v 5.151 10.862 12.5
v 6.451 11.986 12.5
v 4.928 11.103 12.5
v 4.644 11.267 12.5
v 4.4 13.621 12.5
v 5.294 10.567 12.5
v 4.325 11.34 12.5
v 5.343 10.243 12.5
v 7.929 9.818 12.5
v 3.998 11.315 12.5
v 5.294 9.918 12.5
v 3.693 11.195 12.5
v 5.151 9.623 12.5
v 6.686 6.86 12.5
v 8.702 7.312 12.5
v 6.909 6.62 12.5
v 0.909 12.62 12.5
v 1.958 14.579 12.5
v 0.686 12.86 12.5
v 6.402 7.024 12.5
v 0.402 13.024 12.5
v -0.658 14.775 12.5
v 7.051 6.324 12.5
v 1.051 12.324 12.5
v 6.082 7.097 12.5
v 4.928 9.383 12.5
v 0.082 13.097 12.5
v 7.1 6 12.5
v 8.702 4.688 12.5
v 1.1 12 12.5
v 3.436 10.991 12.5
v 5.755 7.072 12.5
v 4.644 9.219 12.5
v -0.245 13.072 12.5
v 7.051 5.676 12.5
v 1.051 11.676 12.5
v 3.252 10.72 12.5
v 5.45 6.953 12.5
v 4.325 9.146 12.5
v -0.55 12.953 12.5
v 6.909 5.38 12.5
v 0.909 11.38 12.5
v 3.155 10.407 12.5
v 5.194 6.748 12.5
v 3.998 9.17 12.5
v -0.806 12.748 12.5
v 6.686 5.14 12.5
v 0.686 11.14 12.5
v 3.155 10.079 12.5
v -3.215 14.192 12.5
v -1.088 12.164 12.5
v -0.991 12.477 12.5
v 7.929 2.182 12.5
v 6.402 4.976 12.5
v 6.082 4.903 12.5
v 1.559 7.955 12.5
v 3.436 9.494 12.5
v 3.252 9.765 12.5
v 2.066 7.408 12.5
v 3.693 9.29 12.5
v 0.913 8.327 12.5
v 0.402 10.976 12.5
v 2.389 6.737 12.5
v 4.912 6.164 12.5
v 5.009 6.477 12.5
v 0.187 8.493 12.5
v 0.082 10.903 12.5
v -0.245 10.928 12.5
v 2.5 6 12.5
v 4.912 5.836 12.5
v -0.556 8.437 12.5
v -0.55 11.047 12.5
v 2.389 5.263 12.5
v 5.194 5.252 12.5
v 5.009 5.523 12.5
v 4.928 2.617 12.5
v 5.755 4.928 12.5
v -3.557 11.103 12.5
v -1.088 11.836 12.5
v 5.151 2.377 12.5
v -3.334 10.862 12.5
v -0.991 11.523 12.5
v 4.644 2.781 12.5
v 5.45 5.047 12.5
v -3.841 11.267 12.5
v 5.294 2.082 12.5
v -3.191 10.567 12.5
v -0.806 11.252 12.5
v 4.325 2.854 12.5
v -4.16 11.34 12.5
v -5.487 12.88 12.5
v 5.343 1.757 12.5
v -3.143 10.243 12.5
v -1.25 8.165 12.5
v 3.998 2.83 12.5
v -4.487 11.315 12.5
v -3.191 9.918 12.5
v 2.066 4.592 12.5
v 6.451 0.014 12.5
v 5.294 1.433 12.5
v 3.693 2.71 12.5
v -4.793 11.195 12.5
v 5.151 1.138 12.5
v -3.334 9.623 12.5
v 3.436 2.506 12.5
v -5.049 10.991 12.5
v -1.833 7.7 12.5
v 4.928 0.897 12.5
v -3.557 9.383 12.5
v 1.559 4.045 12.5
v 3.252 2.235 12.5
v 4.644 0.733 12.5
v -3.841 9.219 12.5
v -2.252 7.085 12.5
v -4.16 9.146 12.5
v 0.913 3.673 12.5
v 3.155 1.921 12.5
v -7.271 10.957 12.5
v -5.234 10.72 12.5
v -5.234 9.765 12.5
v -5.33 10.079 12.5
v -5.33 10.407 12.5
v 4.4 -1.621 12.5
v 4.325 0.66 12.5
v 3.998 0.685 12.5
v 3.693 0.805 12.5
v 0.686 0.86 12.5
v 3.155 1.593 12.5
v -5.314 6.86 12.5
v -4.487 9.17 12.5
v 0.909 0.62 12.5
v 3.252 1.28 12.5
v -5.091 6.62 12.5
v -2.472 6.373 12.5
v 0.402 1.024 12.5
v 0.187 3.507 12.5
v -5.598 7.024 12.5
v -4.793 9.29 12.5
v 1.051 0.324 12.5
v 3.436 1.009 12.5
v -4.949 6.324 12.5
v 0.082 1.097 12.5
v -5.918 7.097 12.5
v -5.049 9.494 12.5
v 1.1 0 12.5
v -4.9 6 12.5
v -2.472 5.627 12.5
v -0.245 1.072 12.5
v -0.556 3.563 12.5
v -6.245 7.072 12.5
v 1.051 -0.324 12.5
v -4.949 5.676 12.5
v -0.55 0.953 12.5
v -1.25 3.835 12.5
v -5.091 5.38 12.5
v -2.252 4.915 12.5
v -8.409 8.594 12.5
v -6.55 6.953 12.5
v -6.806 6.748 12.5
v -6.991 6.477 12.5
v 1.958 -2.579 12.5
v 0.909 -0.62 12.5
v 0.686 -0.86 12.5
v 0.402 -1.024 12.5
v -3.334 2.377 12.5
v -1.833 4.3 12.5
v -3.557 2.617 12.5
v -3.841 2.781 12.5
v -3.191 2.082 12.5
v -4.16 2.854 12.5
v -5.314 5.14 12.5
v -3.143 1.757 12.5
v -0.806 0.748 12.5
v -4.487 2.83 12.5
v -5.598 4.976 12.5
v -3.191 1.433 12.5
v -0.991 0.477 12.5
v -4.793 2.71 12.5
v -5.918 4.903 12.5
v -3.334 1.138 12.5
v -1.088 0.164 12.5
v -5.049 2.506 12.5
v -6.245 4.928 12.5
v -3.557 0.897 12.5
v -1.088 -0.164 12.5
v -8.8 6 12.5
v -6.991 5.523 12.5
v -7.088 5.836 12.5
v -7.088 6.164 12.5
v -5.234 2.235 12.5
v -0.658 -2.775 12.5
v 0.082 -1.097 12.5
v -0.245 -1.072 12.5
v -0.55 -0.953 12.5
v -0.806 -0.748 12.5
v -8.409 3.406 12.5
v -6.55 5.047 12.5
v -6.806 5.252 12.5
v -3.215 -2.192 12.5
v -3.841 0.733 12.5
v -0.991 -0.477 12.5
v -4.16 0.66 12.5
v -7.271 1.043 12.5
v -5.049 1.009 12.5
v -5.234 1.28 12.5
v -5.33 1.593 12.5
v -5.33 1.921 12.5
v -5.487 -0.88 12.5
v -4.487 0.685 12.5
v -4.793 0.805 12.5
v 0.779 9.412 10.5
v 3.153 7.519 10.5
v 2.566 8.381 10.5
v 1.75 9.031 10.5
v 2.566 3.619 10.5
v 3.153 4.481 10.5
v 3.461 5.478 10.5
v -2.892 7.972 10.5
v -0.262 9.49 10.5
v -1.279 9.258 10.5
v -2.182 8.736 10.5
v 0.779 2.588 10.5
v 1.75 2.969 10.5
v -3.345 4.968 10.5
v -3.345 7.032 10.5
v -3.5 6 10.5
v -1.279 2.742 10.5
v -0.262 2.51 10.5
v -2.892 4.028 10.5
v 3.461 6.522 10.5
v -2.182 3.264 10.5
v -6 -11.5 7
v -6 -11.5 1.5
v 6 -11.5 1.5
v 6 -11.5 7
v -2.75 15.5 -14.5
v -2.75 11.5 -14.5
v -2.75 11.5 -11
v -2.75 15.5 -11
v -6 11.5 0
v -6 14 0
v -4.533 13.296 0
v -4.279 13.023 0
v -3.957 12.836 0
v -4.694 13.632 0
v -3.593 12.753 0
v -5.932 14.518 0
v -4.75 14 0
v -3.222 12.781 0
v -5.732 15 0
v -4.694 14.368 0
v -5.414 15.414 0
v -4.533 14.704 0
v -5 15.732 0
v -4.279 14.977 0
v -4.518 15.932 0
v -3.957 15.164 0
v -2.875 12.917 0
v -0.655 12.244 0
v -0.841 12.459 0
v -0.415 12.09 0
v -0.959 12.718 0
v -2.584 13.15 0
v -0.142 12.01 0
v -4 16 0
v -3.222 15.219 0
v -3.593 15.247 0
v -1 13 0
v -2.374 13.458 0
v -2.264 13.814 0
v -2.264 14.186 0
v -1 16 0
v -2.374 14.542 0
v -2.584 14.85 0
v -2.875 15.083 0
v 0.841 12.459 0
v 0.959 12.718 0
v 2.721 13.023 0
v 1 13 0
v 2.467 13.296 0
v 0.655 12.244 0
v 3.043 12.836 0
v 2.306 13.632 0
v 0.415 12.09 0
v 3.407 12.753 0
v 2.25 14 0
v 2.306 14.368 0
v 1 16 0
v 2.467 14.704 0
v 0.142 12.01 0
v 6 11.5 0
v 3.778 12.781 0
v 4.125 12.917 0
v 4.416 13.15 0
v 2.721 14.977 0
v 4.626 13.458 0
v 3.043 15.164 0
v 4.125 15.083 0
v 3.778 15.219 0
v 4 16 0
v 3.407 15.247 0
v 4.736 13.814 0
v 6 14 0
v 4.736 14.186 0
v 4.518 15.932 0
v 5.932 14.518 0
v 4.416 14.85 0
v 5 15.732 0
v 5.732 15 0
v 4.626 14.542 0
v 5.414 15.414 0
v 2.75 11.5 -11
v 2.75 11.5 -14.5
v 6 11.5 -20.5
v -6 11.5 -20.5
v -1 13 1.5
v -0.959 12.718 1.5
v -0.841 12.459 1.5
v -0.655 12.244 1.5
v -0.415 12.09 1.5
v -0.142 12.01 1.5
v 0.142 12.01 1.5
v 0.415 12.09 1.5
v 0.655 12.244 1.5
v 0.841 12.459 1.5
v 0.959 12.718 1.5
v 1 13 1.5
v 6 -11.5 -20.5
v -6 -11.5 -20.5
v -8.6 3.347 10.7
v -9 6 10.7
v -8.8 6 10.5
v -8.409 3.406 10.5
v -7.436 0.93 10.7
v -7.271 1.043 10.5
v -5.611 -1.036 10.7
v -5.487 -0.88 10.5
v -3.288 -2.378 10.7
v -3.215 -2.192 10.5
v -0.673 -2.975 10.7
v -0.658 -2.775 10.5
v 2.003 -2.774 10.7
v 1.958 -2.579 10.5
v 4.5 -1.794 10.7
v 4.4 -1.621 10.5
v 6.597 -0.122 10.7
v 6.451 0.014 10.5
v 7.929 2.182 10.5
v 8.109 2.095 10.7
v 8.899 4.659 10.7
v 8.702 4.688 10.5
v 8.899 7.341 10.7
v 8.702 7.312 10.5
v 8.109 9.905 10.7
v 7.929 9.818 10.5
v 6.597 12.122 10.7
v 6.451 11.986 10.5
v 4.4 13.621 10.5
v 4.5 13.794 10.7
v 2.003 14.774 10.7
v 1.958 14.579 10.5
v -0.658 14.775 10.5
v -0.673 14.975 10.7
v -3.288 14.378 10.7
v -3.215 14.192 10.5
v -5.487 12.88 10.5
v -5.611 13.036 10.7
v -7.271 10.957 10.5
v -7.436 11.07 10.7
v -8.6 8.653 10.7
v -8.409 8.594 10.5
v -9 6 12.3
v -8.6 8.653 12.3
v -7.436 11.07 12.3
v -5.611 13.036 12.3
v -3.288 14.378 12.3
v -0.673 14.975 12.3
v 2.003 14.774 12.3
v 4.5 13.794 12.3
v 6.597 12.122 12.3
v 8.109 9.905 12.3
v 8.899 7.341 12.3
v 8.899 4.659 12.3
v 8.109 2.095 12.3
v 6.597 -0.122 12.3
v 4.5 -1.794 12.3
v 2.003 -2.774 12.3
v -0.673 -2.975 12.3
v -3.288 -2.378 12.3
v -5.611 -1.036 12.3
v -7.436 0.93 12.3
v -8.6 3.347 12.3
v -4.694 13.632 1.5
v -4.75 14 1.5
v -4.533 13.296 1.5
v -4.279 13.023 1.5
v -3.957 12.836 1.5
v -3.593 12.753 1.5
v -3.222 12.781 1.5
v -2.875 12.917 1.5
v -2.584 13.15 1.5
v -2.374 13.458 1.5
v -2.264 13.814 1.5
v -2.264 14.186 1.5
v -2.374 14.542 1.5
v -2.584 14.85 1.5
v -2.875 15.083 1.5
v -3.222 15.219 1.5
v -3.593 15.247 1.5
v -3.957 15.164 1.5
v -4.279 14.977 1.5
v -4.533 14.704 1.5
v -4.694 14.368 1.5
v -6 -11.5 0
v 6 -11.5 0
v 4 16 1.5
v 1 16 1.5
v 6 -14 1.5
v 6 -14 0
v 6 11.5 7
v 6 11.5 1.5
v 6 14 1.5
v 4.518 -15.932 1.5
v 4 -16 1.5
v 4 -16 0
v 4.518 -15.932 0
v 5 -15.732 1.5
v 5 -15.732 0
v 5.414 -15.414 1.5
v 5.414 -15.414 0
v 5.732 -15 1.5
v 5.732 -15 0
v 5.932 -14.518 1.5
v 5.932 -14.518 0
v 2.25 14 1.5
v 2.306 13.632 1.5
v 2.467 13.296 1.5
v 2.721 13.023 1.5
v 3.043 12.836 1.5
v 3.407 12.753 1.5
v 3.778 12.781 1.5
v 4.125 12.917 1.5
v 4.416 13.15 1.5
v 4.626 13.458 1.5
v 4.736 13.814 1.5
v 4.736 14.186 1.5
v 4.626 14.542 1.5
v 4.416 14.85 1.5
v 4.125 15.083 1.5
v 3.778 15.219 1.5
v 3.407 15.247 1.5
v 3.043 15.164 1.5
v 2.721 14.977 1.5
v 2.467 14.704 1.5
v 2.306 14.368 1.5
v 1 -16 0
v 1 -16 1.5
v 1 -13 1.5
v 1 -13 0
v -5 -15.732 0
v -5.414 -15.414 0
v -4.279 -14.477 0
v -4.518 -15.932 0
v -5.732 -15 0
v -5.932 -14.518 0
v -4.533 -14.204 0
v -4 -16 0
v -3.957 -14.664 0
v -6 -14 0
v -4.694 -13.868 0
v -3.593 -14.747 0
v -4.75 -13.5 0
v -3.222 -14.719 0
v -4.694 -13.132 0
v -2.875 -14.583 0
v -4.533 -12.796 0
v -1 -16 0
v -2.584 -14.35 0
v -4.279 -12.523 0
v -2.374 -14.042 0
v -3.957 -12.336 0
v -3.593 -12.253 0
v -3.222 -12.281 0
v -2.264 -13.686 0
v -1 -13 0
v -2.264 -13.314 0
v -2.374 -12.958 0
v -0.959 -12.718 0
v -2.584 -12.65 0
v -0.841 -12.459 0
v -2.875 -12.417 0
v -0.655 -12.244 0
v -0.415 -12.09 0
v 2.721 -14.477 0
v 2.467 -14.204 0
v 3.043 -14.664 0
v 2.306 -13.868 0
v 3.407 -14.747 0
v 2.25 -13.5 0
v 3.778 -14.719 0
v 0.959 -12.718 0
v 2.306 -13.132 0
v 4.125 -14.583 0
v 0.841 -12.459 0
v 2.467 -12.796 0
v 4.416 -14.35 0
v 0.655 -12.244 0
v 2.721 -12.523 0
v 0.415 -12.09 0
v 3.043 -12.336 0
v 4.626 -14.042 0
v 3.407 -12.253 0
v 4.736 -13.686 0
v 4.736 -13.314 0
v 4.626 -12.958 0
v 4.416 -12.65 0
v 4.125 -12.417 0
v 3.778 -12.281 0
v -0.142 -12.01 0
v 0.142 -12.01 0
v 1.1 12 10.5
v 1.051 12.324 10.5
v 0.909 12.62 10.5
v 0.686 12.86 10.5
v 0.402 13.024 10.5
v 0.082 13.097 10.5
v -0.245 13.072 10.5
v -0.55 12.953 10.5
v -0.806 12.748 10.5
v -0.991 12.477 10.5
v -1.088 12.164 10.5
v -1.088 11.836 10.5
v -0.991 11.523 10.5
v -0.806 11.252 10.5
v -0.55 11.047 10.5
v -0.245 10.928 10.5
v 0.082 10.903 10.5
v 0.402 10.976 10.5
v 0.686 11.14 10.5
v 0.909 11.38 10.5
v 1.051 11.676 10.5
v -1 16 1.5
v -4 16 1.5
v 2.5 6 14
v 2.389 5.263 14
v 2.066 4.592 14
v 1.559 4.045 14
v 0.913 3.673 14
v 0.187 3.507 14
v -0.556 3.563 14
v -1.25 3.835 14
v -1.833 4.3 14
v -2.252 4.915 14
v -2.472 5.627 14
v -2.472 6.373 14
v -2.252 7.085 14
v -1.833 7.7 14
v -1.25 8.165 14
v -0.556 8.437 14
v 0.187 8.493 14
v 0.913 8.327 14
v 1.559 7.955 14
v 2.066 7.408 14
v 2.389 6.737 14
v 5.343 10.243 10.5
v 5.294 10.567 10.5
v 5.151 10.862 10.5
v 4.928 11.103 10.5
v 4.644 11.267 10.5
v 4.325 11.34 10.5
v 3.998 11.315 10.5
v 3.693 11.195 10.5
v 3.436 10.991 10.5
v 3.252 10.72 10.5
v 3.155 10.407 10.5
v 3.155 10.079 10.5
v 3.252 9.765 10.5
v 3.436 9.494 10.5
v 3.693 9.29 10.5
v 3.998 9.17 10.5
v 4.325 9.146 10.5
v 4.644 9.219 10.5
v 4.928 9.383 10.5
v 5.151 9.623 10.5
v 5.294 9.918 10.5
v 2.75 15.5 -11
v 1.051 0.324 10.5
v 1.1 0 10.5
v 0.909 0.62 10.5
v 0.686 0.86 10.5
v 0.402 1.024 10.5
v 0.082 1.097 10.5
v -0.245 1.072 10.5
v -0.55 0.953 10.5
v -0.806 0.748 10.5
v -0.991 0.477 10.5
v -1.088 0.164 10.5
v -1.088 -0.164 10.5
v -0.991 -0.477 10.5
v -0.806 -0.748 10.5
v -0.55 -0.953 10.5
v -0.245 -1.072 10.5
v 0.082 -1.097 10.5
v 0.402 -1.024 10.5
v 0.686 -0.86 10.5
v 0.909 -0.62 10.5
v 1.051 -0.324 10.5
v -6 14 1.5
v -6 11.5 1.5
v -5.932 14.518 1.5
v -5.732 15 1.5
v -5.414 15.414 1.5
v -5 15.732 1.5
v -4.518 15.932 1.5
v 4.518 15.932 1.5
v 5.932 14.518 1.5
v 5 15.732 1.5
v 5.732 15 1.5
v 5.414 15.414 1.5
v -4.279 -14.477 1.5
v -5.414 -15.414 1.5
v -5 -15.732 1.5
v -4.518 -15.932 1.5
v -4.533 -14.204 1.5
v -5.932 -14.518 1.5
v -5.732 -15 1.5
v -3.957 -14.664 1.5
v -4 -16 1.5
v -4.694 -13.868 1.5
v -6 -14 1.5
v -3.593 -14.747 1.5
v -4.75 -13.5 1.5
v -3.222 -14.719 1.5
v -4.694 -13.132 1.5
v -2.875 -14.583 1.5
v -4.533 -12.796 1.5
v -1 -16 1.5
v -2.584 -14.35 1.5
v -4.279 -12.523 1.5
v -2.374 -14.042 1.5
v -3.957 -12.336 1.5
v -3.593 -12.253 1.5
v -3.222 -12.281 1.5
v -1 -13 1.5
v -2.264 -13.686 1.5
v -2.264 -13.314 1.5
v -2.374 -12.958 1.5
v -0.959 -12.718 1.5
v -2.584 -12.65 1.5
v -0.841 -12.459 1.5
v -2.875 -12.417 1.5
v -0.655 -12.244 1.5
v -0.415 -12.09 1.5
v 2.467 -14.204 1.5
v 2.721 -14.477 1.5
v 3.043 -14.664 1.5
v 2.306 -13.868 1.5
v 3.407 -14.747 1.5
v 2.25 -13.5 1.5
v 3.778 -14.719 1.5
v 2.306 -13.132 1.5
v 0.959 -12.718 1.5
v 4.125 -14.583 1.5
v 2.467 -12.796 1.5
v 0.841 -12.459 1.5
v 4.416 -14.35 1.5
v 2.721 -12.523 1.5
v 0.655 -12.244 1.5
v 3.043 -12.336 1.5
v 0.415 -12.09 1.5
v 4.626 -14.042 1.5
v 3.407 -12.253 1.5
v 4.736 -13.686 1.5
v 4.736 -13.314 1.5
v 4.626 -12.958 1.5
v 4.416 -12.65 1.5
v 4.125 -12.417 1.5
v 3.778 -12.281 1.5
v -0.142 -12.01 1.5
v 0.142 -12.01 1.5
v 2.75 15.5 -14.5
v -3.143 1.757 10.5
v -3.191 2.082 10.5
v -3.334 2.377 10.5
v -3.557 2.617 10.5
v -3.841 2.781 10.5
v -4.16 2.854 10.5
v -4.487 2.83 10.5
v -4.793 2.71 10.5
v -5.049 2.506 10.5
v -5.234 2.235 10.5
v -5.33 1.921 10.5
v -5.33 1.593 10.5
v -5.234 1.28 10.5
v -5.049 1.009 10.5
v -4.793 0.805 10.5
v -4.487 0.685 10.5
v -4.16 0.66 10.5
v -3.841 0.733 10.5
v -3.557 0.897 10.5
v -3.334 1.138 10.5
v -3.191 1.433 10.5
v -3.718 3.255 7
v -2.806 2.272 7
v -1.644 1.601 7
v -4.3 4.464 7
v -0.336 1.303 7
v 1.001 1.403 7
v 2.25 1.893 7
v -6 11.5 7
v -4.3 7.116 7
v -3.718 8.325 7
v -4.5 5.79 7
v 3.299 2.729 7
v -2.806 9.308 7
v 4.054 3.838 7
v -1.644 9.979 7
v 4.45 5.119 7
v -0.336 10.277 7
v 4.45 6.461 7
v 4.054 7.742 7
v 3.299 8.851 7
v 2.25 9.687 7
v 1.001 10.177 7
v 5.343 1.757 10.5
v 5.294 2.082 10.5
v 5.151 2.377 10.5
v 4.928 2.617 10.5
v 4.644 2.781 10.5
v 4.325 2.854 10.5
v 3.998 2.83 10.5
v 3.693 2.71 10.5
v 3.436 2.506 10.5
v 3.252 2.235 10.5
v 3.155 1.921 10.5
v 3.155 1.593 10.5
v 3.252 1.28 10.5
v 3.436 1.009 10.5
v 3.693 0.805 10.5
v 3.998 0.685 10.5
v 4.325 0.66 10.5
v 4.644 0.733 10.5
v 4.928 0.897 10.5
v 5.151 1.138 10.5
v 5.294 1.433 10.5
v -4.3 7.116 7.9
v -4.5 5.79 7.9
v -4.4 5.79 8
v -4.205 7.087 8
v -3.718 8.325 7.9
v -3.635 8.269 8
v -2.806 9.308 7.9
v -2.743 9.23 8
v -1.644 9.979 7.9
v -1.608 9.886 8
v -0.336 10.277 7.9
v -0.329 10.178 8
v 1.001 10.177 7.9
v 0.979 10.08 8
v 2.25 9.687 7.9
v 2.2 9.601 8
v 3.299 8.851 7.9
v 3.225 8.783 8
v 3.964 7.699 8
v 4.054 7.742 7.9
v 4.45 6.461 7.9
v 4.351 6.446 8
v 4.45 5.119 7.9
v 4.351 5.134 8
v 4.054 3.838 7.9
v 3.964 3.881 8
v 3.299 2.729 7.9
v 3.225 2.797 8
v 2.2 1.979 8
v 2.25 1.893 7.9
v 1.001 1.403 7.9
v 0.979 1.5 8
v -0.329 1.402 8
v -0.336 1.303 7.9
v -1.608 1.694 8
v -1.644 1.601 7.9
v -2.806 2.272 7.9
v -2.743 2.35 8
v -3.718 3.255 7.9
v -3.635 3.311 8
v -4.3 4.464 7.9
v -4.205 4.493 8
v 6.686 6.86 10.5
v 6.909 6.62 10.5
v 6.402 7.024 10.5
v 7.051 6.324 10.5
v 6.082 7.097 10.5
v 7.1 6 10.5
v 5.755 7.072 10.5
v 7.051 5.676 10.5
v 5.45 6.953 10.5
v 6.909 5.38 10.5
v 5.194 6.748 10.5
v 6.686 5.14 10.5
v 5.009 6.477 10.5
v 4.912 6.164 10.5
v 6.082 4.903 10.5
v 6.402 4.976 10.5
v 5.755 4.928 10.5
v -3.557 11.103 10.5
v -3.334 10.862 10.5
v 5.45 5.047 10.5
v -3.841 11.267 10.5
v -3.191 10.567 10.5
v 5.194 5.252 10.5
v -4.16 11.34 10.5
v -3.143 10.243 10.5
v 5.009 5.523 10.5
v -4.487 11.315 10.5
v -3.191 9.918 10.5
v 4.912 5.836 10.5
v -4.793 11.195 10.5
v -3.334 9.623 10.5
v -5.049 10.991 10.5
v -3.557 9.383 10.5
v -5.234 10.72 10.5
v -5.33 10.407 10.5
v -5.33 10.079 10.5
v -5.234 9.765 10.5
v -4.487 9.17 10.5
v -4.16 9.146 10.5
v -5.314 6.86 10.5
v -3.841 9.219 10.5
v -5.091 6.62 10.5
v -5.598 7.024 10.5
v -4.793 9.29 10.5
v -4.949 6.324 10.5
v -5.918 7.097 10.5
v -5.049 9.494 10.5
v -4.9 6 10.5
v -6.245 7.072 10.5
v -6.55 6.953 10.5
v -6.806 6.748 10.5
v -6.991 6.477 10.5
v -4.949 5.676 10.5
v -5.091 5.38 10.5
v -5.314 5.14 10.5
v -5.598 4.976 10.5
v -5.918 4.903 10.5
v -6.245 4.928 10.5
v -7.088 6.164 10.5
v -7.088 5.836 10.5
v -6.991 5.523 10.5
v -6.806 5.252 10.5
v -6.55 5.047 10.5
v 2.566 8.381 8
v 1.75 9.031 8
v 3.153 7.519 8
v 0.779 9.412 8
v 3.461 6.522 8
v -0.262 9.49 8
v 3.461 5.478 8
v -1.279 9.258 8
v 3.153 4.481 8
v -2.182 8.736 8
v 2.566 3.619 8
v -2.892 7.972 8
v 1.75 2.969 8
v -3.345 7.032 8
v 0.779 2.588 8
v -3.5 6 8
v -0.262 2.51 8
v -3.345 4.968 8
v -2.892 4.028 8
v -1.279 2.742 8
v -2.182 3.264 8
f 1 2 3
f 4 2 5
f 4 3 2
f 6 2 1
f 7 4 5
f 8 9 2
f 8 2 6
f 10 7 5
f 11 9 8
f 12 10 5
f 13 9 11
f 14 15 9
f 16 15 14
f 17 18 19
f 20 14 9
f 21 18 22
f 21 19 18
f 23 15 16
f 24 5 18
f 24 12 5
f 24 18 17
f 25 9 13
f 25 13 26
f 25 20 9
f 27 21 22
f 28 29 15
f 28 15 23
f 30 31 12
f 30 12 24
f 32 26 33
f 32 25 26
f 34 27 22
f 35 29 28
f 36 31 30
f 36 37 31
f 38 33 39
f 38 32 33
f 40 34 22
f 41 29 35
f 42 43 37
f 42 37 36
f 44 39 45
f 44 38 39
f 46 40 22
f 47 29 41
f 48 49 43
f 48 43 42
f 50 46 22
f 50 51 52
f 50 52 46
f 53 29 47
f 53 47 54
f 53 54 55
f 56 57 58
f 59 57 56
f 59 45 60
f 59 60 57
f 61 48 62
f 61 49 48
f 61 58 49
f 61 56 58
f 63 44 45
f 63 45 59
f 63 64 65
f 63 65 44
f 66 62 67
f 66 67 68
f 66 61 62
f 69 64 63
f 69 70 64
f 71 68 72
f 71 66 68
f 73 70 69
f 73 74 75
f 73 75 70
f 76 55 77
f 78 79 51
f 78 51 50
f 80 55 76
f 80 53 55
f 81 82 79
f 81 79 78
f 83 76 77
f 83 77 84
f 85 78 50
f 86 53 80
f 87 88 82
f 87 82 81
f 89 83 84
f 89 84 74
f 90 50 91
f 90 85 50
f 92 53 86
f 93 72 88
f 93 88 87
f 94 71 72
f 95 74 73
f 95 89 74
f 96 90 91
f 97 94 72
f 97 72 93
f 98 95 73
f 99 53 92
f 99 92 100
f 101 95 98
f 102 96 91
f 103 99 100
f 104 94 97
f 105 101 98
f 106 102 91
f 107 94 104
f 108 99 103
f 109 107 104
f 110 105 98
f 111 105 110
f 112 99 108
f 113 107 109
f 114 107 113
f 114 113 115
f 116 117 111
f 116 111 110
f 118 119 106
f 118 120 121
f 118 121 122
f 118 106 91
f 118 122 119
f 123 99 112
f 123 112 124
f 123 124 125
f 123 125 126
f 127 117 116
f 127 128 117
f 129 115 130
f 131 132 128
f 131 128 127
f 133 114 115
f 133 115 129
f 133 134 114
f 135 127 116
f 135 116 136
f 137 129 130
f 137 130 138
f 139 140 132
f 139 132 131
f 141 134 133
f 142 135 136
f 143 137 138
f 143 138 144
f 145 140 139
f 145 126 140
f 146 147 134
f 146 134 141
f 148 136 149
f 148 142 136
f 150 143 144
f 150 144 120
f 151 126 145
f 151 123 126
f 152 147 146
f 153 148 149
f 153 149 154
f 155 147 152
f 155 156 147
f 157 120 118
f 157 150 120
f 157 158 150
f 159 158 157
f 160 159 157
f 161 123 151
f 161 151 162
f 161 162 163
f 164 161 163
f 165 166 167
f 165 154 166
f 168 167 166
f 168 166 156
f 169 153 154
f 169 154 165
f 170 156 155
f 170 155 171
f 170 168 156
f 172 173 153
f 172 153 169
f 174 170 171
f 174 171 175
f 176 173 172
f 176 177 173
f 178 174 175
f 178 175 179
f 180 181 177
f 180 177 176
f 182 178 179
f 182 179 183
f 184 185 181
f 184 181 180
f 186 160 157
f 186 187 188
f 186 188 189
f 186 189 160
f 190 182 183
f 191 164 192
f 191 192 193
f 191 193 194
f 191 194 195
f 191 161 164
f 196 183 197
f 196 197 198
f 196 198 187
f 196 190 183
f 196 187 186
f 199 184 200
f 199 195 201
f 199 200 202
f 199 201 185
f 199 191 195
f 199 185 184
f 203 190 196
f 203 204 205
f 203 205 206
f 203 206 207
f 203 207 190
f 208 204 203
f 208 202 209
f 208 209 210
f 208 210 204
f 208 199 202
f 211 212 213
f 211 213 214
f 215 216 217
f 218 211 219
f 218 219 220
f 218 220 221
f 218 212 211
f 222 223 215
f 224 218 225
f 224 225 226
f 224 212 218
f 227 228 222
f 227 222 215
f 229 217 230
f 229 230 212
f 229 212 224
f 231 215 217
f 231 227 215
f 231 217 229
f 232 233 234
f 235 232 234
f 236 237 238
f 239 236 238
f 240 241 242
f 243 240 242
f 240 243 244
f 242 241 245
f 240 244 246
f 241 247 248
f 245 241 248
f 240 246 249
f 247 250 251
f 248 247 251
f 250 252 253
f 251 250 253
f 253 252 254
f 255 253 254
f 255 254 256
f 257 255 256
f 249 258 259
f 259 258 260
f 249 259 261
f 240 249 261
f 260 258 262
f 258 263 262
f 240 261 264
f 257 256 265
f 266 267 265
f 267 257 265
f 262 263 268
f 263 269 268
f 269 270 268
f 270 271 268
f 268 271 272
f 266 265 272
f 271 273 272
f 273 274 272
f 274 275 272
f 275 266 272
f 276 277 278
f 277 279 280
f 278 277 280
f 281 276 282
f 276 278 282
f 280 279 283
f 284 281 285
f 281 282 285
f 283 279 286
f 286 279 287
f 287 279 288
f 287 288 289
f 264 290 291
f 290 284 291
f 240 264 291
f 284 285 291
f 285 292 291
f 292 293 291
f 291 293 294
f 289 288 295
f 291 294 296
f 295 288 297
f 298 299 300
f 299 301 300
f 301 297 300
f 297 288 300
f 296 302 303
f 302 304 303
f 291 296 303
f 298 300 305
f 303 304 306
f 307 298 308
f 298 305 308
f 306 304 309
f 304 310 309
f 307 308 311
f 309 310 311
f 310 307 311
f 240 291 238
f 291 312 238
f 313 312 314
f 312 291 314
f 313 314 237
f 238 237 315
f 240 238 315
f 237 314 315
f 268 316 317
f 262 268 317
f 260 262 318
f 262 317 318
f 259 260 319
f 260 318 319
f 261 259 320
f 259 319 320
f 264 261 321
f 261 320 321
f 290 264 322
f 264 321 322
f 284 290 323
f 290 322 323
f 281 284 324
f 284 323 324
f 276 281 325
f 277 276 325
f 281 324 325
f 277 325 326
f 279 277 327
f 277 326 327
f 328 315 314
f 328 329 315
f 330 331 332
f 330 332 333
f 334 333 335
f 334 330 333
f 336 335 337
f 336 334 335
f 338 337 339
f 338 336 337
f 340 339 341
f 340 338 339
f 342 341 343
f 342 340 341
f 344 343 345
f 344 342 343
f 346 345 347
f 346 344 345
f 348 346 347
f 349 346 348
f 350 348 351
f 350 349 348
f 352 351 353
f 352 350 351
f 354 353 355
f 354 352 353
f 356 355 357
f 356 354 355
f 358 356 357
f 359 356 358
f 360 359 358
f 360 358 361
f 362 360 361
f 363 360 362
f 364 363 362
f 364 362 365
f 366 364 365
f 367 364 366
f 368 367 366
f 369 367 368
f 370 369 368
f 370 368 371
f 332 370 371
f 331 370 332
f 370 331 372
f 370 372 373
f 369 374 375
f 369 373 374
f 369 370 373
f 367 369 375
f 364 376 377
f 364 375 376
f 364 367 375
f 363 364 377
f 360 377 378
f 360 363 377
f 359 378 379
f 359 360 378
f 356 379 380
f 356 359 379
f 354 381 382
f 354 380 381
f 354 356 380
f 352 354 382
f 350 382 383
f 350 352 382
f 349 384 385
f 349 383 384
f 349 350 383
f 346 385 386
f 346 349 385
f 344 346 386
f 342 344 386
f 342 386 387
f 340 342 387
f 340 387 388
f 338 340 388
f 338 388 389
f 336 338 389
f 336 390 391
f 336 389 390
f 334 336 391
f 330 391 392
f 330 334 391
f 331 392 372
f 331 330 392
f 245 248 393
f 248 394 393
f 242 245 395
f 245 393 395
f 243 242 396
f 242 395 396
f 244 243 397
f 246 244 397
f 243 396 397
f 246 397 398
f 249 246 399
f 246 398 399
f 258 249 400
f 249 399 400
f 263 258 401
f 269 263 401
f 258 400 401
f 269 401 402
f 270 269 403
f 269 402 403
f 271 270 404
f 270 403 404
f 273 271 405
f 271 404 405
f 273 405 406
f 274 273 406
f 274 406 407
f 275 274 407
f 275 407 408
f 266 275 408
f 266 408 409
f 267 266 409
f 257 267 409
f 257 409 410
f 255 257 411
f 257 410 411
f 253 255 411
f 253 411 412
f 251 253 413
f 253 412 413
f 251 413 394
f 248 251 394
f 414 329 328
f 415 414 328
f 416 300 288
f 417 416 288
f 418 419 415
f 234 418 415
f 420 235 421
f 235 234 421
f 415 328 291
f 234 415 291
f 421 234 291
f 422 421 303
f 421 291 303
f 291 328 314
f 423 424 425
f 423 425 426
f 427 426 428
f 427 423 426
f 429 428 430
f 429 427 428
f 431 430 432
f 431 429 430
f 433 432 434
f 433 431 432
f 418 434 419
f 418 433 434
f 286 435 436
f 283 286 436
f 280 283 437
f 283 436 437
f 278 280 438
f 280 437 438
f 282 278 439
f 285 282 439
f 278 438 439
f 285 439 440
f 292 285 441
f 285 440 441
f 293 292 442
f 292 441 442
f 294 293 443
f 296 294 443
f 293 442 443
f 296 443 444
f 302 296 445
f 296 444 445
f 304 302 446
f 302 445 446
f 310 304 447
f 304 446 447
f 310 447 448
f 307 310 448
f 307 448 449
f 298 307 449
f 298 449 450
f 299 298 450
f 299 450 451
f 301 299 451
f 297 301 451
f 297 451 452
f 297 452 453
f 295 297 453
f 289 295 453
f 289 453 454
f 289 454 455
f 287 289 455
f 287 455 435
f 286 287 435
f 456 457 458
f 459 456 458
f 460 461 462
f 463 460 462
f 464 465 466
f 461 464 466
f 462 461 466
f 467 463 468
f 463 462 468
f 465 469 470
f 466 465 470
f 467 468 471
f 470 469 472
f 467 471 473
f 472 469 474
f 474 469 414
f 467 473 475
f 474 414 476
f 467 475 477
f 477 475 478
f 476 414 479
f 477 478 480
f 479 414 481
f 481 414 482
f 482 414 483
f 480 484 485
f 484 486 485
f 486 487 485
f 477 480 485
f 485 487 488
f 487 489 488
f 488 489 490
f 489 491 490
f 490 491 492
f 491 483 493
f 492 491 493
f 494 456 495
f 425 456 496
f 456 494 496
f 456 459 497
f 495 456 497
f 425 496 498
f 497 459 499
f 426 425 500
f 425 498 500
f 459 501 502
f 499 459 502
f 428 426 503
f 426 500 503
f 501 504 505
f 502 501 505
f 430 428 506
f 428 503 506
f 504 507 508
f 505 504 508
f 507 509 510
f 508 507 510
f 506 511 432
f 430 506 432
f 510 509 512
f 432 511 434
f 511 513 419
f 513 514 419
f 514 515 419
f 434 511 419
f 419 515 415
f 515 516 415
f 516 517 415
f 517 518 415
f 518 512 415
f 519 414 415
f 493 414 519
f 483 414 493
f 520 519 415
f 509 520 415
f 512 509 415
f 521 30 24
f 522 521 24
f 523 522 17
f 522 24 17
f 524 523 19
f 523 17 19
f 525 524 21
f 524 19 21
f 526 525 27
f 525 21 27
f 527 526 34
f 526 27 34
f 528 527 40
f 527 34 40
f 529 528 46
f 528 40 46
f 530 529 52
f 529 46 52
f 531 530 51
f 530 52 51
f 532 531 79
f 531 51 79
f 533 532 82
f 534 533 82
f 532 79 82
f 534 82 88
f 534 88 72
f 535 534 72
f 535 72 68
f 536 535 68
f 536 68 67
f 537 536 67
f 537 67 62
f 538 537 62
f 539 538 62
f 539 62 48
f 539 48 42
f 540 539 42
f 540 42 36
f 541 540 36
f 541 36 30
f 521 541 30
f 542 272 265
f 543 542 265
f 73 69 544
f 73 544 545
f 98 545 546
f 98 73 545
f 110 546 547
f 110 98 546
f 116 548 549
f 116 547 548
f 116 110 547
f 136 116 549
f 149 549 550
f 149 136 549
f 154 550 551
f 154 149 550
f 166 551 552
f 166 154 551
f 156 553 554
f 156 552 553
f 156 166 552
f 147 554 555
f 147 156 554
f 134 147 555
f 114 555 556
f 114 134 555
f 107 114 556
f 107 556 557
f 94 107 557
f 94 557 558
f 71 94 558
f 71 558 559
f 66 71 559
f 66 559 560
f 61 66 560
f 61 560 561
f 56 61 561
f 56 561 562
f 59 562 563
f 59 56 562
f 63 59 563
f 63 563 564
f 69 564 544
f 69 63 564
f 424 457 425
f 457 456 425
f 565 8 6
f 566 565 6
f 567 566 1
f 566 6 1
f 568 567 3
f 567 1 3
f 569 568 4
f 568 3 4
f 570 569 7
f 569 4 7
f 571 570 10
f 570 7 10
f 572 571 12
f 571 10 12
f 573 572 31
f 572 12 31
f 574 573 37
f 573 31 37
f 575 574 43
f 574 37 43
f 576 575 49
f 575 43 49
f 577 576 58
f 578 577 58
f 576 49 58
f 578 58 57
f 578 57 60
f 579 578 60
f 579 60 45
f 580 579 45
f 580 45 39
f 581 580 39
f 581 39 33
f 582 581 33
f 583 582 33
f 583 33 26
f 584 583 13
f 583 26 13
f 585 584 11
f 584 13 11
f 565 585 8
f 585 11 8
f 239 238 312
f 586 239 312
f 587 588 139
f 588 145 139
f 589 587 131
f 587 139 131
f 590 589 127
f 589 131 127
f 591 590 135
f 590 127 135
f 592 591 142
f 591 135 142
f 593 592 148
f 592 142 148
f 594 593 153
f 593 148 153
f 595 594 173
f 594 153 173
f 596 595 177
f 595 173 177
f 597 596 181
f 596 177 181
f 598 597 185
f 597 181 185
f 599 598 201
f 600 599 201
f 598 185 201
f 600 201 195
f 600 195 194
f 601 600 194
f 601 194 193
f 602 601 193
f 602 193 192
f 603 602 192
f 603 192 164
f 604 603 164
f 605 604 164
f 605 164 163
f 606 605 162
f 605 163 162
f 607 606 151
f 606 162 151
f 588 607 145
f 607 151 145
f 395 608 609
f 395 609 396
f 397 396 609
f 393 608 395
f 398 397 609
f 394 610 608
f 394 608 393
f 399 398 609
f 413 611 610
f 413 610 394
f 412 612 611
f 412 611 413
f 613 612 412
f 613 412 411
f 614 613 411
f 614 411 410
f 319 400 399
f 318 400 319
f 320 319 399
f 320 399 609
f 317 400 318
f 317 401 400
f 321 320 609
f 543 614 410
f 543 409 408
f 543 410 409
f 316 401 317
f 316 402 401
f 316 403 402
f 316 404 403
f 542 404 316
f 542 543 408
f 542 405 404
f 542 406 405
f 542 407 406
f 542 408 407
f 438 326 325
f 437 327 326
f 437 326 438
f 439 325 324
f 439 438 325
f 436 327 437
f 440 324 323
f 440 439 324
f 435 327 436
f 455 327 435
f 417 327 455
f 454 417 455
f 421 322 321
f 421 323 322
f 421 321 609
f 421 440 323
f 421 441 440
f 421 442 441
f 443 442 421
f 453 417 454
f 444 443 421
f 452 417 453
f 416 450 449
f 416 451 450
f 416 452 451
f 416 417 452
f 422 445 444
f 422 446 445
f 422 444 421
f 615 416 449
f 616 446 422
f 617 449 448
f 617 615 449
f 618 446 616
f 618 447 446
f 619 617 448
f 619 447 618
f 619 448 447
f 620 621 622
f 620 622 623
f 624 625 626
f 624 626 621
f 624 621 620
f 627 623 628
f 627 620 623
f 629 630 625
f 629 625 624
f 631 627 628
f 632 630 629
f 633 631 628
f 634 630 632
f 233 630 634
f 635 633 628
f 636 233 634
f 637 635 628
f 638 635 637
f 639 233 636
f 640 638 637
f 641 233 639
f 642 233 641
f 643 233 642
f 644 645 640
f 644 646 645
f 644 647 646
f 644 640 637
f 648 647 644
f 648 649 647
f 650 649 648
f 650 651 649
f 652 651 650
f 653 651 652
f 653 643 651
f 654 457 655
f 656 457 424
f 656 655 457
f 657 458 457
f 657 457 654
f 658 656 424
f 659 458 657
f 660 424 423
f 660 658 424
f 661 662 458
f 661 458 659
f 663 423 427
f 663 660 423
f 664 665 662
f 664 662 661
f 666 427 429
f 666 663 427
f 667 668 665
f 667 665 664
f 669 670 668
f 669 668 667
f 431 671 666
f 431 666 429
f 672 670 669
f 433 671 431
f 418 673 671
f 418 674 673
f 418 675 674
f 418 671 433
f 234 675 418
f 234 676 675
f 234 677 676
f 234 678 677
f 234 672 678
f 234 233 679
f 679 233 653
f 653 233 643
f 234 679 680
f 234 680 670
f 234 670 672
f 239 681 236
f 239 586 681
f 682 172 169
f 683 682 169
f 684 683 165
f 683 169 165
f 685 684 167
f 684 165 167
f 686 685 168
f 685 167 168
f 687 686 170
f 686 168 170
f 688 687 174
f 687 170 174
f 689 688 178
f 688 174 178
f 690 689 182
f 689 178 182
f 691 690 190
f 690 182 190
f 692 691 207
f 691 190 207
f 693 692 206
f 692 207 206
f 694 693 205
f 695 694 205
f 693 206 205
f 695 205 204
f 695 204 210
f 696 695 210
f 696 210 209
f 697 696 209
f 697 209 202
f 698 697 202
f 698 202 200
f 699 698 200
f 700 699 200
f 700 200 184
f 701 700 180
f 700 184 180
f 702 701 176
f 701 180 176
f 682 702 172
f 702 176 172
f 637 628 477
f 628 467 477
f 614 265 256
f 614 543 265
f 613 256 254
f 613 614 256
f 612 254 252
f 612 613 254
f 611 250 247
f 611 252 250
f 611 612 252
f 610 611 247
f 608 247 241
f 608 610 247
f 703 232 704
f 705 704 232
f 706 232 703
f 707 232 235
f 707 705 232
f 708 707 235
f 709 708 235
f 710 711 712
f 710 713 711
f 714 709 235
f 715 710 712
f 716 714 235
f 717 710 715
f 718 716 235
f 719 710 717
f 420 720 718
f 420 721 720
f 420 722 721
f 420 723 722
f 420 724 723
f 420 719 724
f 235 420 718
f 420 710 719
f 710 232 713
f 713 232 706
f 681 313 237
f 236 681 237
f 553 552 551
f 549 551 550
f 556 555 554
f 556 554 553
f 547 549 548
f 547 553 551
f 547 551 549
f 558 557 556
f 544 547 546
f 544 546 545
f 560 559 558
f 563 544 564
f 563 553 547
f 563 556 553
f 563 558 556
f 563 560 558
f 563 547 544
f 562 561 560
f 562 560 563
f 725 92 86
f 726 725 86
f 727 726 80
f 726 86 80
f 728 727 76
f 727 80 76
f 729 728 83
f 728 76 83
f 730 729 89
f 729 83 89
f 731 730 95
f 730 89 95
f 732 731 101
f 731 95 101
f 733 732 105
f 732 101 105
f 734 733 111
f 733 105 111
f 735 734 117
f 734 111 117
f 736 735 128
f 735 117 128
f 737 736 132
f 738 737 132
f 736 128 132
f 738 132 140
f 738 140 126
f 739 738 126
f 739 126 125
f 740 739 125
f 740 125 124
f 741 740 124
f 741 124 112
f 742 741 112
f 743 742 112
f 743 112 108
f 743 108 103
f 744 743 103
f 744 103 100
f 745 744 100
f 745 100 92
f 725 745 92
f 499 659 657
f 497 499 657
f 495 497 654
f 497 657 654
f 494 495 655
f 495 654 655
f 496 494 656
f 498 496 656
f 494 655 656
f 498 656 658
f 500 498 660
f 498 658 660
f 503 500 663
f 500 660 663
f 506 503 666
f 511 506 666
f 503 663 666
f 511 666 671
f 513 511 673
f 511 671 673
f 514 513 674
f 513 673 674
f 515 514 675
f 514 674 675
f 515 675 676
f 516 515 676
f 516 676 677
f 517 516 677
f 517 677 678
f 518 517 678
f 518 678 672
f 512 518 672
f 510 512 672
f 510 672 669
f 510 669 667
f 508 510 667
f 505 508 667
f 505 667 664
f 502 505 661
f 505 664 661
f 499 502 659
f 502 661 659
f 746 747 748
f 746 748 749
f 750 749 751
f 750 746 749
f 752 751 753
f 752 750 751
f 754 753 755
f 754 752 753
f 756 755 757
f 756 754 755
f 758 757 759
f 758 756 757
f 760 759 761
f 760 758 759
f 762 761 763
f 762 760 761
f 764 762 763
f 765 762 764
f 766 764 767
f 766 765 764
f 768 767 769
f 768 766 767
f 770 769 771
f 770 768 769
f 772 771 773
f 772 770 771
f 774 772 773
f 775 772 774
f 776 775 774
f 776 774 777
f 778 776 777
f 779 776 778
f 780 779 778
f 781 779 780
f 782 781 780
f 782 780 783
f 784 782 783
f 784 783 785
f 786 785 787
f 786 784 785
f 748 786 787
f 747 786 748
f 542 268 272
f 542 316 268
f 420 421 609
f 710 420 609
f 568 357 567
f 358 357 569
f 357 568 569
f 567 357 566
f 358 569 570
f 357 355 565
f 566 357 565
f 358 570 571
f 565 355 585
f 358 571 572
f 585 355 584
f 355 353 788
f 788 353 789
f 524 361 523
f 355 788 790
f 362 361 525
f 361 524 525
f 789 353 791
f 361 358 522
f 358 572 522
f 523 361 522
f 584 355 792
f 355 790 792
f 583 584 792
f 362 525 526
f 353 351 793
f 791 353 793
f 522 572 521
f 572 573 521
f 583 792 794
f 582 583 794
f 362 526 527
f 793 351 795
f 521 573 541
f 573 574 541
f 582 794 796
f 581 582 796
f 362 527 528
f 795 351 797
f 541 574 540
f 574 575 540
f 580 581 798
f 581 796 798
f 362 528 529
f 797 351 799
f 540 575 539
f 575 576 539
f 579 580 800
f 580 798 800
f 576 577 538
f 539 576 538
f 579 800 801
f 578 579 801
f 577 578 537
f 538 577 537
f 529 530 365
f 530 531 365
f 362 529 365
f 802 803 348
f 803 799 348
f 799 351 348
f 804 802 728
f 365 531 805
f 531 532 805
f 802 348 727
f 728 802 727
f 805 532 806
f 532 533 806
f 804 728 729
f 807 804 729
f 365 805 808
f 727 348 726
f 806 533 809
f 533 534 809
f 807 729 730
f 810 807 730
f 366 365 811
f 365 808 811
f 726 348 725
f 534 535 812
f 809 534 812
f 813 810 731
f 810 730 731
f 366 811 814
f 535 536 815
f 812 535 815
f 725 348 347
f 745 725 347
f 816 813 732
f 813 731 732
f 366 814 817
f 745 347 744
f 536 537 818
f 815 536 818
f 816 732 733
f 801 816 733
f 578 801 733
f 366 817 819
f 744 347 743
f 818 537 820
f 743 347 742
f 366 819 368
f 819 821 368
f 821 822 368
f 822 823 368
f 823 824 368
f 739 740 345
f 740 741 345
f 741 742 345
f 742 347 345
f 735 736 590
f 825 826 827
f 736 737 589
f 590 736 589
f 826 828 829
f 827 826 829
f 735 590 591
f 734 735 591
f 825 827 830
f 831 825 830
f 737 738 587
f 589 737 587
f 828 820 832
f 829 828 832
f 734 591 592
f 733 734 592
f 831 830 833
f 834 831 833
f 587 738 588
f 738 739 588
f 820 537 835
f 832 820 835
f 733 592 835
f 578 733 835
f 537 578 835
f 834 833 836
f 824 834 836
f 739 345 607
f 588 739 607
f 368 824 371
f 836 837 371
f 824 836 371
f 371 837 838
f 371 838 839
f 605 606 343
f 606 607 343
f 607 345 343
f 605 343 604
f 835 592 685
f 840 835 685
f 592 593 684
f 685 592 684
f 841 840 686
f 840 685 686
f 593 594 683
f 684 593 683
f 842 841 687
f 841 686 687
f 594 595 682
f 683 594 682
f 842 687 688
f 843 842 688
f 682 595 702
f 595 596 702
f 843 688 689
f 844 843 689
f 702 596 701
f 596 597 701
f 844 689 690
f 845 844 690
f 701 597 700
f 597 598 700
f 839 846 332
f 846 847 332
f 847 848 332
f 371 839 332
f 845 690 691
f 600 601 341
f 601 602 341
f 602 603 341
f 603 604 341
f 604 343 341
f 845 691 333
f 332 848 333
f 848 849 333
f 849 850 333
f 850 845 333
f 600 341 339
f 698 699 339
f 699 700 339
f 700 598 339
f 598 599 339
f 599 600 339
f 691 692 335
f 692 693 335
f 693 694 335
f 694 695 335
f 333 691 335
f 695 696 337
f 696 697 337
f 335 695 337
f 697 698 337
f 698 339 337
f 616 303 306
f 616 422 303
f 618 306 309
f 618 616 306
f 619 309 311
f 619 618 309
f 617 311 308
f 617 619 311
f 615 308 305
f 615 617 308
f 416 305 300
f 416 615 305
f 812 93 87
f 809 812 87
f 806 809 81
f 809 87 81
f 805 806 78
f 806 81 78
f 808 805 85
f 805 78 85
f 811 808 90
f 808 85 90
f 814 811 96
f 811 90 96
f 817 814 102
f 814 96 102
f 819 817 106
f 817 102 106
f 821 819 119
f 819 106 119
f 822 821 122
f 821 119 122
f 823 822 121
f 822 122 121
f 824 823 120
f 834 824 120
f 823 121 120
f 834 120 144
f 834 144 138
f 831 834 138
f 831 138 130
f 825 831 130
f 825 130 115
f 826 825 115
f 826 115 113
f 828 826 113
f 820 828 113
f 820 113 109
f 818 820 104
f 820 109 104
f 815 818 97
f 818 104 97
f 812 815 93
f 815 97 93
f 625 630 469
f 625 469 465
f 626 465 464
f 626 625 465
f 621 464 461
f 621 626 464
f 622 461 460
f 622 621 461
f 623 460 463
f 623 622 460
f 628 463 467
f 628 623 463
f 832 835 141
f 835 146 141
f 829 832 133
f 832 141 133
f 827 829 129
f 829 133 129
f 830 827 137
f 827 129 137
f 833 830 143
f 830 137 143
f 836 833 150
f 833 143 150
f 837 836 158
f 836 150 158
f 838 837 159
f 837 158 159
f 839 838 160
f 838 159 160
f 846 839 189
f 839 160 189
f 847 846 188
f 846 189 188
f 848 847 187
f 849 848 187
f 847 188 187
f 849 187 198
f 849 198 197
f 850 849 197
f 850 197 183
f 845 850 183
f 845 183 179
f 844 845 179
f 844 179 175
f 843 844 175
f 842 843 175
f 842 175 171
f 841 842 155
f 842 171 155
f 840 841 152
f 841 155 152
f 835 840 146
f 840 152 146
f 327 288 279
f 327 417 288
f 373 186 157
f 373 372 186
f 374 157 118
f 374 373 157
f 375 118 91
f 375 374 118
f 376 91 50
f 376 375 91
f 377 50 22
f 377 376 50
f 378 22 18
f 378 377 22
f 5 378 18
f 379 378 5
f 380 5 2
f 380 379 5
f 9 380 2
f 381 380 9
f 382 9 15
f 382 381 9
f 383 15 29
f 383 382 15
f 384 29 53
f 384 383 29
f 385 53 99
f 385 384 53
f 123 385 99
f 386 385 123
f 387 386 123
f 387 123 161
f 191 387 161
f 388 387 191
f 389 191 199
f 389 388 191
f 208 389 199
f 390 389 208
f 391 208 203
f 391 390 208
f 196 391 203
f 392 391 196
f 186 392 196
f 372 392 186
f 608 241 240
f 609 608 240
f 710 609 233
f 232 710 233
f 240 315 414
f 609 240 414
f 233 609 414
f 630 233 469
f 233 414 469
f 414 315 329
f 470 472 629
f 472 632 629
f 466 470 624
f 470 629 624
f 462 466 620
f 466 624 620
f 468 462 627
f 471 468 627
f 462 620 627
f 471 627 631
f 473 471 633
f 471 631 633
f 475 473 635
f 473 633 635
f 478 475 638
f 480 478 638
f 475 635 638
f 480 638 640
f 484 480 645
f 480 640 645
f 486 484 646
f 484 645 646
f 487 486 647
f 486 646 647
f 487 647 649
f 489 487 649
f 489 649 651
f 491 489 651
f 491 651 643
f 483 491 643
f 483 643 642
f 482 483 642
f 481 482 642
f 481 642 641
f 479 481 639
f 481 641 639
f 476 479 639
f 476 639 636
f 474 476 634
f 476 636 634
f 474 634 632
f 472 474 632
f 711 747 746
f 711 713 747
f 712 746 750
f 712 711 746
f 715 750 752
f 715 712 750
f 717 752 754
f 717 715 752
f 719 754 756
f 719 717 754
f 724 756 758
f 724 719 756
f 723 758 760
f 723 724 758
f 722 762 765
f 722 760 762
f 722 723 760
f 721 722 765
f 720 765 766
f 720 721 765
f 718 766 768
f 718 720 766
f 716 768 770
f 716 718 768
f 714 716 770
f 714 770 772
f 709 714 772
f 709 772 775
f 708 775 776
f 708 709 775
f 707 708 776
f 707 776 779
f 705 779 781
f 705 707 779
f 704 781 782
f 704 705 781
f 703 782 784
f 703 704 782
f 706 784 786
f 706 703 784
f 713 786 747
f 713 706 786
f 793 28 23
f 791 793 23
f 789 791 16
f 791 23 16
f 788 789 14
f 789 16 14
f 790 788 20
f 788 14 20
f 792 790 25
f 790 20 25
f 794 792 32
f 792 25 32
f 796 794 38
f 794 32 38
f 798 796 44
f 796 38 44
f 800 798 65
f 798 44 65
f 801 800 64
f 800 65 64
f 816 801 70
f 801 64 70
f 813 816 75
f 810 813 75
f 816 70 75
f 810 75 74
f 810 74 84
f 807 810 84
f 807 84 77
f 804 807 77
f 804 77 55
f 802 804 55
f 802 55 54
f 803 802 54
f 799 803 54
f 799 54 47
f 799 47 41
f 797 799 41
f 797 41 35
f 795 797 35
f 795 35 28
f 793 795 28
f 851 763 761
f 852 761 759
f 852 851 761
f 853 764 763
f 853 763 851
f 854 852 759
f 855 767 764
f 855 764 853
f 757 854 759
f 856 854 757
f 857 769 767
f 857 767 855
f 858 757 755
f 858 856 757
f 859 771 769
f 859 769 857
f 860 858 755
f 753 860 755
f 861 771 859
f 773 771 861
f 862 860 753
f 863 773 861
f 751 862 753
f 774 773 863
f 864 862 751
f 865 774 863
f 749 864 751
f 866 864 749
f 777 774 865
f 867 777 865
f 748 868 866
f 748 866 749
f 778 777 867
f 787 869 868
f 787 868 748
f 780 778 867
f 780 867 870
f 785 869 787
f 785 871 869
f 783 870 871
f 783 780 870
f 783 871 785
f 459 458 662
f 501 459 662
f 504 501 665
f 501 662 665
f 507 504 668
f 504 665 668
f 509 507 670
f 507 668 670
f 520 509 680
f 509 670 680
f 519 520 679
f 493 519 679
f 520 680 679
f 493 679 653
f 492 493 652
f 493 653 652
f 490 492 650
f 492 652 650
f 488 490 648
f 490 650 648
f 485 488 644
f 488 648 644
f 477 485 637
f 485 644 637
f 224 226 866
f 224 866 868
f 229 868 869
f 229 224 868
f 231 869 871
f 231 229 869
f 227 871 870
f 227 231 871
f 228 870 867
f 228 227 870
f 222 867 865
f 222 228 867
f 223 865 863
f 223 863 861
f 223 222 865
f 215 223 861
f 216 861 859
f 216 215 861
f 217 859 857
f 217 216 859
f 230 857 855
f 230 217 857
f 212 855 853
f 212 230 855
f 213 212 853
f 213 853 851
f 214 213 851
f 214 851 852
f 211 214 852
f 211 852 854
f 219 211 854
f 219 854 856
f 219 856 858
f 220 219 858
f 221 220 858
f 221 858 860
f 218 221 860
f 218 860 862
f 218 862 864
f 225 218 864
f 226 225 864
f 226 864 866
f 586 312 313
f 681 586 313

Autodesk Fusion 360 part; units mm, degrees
sketch "스케치1" plane through (0, 0, 0) normal (0, 0, 1) x (1, 0, 0)
  line L0 (6, 11.5) -> (-6, 11.5)
  line L1 (-6, 11.5) -> (-6, -11.5)
  line L2 (-6, -11.5) -> (6, -11.5)
  line L3 (6, -11.5) -> (6, 11.5)
  line L4 (6, 11.5) -> (-6, -11.5) construction
  line L5 (-6, 11.5) -> (6, -11.5) construction
  dimension "d1" = 12
  dimension "d2" = 23
extrude "돌출1" add sketch "스케치1" along normal blind 7 makes body 1
sketch "스케치2" plane through (0, 0, 0) normal (0, 0, -1) x (1, 0, 0)
  line L0 (6, -11.5) -> (6, 11.5)
  line L1 (6, 11.5) -> (-6, 11.5)
  line L2 (-6, 11.5) -> (-6, -11.5)
  line L3 (-6, -11.5) -> (6, -11.5)
extrude "돌출2" add sketch "스케치2" along normal blind 20.5 bodies 1
sketch "스케치3" plane through (0, 0, 0) normal (0, 0, 1) x (1, 0, 0)
  line L0 (-6, -16) -> (6, -16)
  line L1 (6, -16) -> (6, 16)
  line L2 (6, 16) -> (-6, 16)
  line L3 (-6, 16) -> (-6, -16)
  line L4 (-6, -16) -> (6, 16) construction
  line L5 (6, -16) -> (-6, 16) construction
  dimension "d7" = 12
  dimension "d8" = 32
extrude "돌출3" add sketch "스케치3" along normal blind 1.5 bodies 1
sketch "스케치4" plane through (0, 0, 7) normal (0, 0, 1) x (-1, 0, 0)
  line L0 (-6, 11.5) -> (-6, -11.5)
  line L1 (-6, -11.5) -> (6, -11.5)
  line L2 (6, -11.5) -> (6, 11.5)
  line L3 (6, 11.5) -> (-6, 11.5)
  circle A0 centre (0, -5.79) radius 4.5
  dimension "d11" = 9
  dimension "d12" = 5.71
extrude "돌출4" add sketch "스케치4" along normal blind 1 contours A0 bodies 1
fillet "필렛1" radius 2 4 edges at (6, 16, 0.75) (-6, 16, 0.75) (6, -16, 0.75) (-6, -16, 0.75) on bodies 1
sketch "스케치5" plane through (0, 0, 1.5) normal (0, 0, 1) x (-1, 0, 0)
  arc A0 (4, -16) -> (6, -14) centre (4, -14) ccw
  line L0 (6, -14) -> (6, -11.5)
  line L1 (6, -11.5) -> (-6, -11.5)
  line L2 (-6, -11.5) -> (-6, -14)
  arc A1 (-6, -14) -> (-4, -16) centre (-4, -14) ccw
  line L3 (-4, -16) -> (4, -16)
  circle A2 centre (3.5, -14) radius 1.25
  circle A3 centre (-3.5, -14) radius 1.25
  line L4 (-6, -11.5) -> (6, -11.5)
  line L5 (1, -16) -> (-1, -16)
  line L6 (-1, -16) -> (-1, -13)
  line L7 (1, -13) -> (1, -16)
  line L8 (1, -16) -> (-1, -13) construction
  line L9 (-1, -16) -> (1, -13) construction
  circle A4 centre (0, -13) radius 1
  point P0 (0, -14.5)
  dimension "d17" = 2.5
  dimension "d18" = 2.5
  dimension "d19" = 2.5
  dimension "d20" = 2.5
  dimension "d21" = 2.5
  dimension "d22" = 2.5
  dimension "d23" = 2
  dimension "d24" = 3
extrude "돌출5" cut sketch "스케치5" against normal blind 1.5 contours L3 L5 L6 L7 A4 | A4 | A2 | A3 bodies 1
sketch "스케치6" plane through (0, 0, 1.5) normal (0, 0, 1) x (-1, 0, 0)
  arc A0 (6, 14) -> (4, 16) centre (4, 14) ccw
  line L0 (4, 16) -> (-4, 16)
  arc A1 (-4, 16) -> (-6, 14) centre (-4, 14) ccw
  line L1 (-6, 14) -> (-6, 11.5)
  line L2 (-6, 11.5) -> (6, 11.5)
  line L3 (6, 11.5) -> (6, 14)
  circle A2 centre (3.5, 13.5) radius 1.25
  circle A3 centre (-3.5, 13.5) radius 1.25
  line L4 (1, 16) -> (-1, 16)
  line L5 (-1, 16) -> (-1, 13)
  line L6 (-1, 13) -> (1, 13)
  line L7 (1, 13) -> (1, 16)
  line L8 (1, 16) -> (-1, 13) construction
  line L9 (-1, 16) -> (1, 13) construction
  circle A4 centre (0, 13) radius 1
  point P0 (0, 14.5)
  dimension "d27" = 2.5
  dimension "d28" = 2.5
  dimension "d29" = 2.5
  dimension "d30" = 2.5
  dimension "d31" = 2.5
  dimension "d32" = 2.5
  dimension "d33" = 2
  dimension "d34" = 3
extrude "돌출6" cut sketch "스케치6" against normal blind 1.5 contours L0 L4 L5 L7 A4 | L6 A4 | L6 A4 | A2 | A3 bodies 1
sketch "스케치7" plane through (0, 0, 8) normal (0, 0, 1) x (-1, 0, 0)
  circle A0 centre (0, -5.79) radius 4.5
sketch "스케치8" plane through (0, 0, 8) normal (0, 0, 1) x (-1, 0, 0)
  circle A0 centre (0, -6) radius 2
  dimension "d37" = 4
extrude "돌출7" add sketch "스케치8" along normal blind 2.5 bodies 1
sketch "스케치9" plane through (0, 0, 10.5) normal (0, 0, 1) x (-1, 0, 0)
  circle A0 centre (0, -6) radius 2
  circle A1 centre (0, -6) radius 3.5
  dimension "d40" = 7
extrude "돌출8" add sketch "스케치9" against normal blind 2.5 bodies 1
chamfer "챔퍼2" distance 0.1 angle 45 1 edges at (4.1955, 7.4173, 8) on bodies 1
sketch "스케치13" plane through (0, 11.5, 0) normal (0, 1, 0) x (-1, 0, 0)
  line L0 (6, 0) -> (-6, 0)
  line L1 (-6, 0) -> (-6, -20.5)
  line L2 (-6, -20.5) -> (6, -20.5)
  line L3 (6, -20.5) -> (6, 0)
  line L4 (2.75, -11) -> (-2.75, -11)
  line L5 (-2.75, -11) -> (-2.75, -14.5)
  line L6 (-2.75, -14.5) -> (2.75, -14.5)
  line L7 (2.75, -14.5) -> (2.75, -11)
  line L8 (2.75, -11) -> (-2.75, -14.5) construction
  line L9 (-2.75, -11) -> (2.75, -14.5) construction
  point P0 (0, -12.75)
  dimension "d66" = 5.5
  dimension "d67" = 3.5
  dimension "d68" = 9.5
  dimension "d69" = 3.25
extrude "돌출12" add sketch "스케치13" along normal blind 4 contours L4 L5 L6 L7 bodies 1
sketch "스케치14" plane through (0, 0, 0) normal (0, 0, 1) x (1, 0, 0)
  circle A0 centre (35, 0) radius 9
  dimension "d72" = 18
extrude "돌출13" add sketch "스케치14" along normal blind 2 separate body makes body 2
copy_body "본체->구성요소1" bodies 2 removing the originals makes body 3 in component "Horn"
sketch "스케치15" plane through (0, 0, 0) normal (0, 0, 1) x (1, 0, 0)
sketch "스케치16" plane through (0, 0, 2) normal (0, 0, 1) x (-1, 0, 0)
  circle A0 centre (-35, 0) radius 9
  circle A1 centre (-35, 0) radius 6
  circle A2 centre (-29, 0) radius 1.1
  circle A3 centre (-35, 6) radius 1.1
  circle A4 centre (-35, -6) radius 1.1
  circle A5 centre (-41, 0) radius 1.1
  circle A6 centre (-39.2426, 4.2426) radius 1.1
  circle A7 centre (-30.7574, -4.2426) radius 1.1
  line L0 (-35, 0) -> (-41.0673, -6.0673)
  line L1 (-35, 0) -> (-26.4196, 0) construction
  circle A8 centre (-39.2426, -4.2426) radius 1.1
  line L2 (-35, 0) -> (-42, 7)
  line L3 (-35, 0) -> (-25.1005, 0) construction
  line L4 (-35, 0) -> (-25.88, 9.12)
  line L5 (-35, 0) -> (-22.1024, 0) construction
  circle A9 centre (-30.7574, 4.2426) radius 1.1
  line L6 (-35, 0) -> (-26.5147, -8.4853)
  line L7 (-35, 0) -> (-23.0742, 0) construction
  dimension "d75" = 12
  dimension "d76" = 2.2
  dimension "d77" = 2.2
  dimension "d78" = 2.2
  dimension "d79" = 2.2
  dimension "d80" = 2.2
  dimension "d81" = 2.2
  dimension "d82" = 135
  dimension "d83" = 2.2
  dimension "d84" = 135
  dimension "d85" = 45
  dimension "d86" = 2.2
  dimension "d87" = 45
extrude "돌출1'" cut sketch "스케치16" against normal blind 2 contours A1 L4 A9 | A1 L4 A9 | A1 A7 L6 | A1 A7 L6 | A1 A6 L2 | A1 A6 L2 | A1 L4 A9 | A1 L4 A9 | A1 A7 L6 | A1 A7 L6 | A1 A6 L2 | A1 A6 L2 | A1 A3 | A1 A3 | A1 A4 | A1 A4 | A1 A5 | A1 A5 | A1 A2 | A1 A2 | A1 L0 A8 | A1 L0 A8 | A1 L0 A8 | A1 L0 A8 bodies 3 in component "Horn"
chamfer "챔퍼1" distance 0.2 angle 45 2 edges at (26.6091, -3.2545, 0) (26.6091, -3.2545, 2) on bodies 3 in component "Horn"
sketch "스케치17" plane through (0, 0, 2) normal (0, 0, 1) x (-1, 0, 0)
  circle A0 centre (-35, -6) radius 1.1
  circle A1 centre (-39.2426, 4.2426) radius 1.1
  circle A2 centre (-35, 6) radius 1.1
  circle A3 centre (-41, 0) radius 1.1
  circle A4 centre (-30.7574, -4.2426) radius 1.1
  circle A5 centre (-29, 0) radius 1.1
  circle A6 centre (-30.7574, 4.2426) radius 1.1
  circle A7 centre (-39.2426, -4.2426) radius 1.1
  circle A8 centre (-35, 0) radius 8.8
  circle A9 centre (-35, 0) radius 2.5
  dimension "d91" = 5
extrude "돌출2'" add sketch "스케치17" along normal blind 1.5 contours A9 bodies 3 in component "Horn"
component "Horn" placed x (-1, 0, 0) y (0, -1, 0) z (0, 0, 1) at (35, 6, 10.5)
